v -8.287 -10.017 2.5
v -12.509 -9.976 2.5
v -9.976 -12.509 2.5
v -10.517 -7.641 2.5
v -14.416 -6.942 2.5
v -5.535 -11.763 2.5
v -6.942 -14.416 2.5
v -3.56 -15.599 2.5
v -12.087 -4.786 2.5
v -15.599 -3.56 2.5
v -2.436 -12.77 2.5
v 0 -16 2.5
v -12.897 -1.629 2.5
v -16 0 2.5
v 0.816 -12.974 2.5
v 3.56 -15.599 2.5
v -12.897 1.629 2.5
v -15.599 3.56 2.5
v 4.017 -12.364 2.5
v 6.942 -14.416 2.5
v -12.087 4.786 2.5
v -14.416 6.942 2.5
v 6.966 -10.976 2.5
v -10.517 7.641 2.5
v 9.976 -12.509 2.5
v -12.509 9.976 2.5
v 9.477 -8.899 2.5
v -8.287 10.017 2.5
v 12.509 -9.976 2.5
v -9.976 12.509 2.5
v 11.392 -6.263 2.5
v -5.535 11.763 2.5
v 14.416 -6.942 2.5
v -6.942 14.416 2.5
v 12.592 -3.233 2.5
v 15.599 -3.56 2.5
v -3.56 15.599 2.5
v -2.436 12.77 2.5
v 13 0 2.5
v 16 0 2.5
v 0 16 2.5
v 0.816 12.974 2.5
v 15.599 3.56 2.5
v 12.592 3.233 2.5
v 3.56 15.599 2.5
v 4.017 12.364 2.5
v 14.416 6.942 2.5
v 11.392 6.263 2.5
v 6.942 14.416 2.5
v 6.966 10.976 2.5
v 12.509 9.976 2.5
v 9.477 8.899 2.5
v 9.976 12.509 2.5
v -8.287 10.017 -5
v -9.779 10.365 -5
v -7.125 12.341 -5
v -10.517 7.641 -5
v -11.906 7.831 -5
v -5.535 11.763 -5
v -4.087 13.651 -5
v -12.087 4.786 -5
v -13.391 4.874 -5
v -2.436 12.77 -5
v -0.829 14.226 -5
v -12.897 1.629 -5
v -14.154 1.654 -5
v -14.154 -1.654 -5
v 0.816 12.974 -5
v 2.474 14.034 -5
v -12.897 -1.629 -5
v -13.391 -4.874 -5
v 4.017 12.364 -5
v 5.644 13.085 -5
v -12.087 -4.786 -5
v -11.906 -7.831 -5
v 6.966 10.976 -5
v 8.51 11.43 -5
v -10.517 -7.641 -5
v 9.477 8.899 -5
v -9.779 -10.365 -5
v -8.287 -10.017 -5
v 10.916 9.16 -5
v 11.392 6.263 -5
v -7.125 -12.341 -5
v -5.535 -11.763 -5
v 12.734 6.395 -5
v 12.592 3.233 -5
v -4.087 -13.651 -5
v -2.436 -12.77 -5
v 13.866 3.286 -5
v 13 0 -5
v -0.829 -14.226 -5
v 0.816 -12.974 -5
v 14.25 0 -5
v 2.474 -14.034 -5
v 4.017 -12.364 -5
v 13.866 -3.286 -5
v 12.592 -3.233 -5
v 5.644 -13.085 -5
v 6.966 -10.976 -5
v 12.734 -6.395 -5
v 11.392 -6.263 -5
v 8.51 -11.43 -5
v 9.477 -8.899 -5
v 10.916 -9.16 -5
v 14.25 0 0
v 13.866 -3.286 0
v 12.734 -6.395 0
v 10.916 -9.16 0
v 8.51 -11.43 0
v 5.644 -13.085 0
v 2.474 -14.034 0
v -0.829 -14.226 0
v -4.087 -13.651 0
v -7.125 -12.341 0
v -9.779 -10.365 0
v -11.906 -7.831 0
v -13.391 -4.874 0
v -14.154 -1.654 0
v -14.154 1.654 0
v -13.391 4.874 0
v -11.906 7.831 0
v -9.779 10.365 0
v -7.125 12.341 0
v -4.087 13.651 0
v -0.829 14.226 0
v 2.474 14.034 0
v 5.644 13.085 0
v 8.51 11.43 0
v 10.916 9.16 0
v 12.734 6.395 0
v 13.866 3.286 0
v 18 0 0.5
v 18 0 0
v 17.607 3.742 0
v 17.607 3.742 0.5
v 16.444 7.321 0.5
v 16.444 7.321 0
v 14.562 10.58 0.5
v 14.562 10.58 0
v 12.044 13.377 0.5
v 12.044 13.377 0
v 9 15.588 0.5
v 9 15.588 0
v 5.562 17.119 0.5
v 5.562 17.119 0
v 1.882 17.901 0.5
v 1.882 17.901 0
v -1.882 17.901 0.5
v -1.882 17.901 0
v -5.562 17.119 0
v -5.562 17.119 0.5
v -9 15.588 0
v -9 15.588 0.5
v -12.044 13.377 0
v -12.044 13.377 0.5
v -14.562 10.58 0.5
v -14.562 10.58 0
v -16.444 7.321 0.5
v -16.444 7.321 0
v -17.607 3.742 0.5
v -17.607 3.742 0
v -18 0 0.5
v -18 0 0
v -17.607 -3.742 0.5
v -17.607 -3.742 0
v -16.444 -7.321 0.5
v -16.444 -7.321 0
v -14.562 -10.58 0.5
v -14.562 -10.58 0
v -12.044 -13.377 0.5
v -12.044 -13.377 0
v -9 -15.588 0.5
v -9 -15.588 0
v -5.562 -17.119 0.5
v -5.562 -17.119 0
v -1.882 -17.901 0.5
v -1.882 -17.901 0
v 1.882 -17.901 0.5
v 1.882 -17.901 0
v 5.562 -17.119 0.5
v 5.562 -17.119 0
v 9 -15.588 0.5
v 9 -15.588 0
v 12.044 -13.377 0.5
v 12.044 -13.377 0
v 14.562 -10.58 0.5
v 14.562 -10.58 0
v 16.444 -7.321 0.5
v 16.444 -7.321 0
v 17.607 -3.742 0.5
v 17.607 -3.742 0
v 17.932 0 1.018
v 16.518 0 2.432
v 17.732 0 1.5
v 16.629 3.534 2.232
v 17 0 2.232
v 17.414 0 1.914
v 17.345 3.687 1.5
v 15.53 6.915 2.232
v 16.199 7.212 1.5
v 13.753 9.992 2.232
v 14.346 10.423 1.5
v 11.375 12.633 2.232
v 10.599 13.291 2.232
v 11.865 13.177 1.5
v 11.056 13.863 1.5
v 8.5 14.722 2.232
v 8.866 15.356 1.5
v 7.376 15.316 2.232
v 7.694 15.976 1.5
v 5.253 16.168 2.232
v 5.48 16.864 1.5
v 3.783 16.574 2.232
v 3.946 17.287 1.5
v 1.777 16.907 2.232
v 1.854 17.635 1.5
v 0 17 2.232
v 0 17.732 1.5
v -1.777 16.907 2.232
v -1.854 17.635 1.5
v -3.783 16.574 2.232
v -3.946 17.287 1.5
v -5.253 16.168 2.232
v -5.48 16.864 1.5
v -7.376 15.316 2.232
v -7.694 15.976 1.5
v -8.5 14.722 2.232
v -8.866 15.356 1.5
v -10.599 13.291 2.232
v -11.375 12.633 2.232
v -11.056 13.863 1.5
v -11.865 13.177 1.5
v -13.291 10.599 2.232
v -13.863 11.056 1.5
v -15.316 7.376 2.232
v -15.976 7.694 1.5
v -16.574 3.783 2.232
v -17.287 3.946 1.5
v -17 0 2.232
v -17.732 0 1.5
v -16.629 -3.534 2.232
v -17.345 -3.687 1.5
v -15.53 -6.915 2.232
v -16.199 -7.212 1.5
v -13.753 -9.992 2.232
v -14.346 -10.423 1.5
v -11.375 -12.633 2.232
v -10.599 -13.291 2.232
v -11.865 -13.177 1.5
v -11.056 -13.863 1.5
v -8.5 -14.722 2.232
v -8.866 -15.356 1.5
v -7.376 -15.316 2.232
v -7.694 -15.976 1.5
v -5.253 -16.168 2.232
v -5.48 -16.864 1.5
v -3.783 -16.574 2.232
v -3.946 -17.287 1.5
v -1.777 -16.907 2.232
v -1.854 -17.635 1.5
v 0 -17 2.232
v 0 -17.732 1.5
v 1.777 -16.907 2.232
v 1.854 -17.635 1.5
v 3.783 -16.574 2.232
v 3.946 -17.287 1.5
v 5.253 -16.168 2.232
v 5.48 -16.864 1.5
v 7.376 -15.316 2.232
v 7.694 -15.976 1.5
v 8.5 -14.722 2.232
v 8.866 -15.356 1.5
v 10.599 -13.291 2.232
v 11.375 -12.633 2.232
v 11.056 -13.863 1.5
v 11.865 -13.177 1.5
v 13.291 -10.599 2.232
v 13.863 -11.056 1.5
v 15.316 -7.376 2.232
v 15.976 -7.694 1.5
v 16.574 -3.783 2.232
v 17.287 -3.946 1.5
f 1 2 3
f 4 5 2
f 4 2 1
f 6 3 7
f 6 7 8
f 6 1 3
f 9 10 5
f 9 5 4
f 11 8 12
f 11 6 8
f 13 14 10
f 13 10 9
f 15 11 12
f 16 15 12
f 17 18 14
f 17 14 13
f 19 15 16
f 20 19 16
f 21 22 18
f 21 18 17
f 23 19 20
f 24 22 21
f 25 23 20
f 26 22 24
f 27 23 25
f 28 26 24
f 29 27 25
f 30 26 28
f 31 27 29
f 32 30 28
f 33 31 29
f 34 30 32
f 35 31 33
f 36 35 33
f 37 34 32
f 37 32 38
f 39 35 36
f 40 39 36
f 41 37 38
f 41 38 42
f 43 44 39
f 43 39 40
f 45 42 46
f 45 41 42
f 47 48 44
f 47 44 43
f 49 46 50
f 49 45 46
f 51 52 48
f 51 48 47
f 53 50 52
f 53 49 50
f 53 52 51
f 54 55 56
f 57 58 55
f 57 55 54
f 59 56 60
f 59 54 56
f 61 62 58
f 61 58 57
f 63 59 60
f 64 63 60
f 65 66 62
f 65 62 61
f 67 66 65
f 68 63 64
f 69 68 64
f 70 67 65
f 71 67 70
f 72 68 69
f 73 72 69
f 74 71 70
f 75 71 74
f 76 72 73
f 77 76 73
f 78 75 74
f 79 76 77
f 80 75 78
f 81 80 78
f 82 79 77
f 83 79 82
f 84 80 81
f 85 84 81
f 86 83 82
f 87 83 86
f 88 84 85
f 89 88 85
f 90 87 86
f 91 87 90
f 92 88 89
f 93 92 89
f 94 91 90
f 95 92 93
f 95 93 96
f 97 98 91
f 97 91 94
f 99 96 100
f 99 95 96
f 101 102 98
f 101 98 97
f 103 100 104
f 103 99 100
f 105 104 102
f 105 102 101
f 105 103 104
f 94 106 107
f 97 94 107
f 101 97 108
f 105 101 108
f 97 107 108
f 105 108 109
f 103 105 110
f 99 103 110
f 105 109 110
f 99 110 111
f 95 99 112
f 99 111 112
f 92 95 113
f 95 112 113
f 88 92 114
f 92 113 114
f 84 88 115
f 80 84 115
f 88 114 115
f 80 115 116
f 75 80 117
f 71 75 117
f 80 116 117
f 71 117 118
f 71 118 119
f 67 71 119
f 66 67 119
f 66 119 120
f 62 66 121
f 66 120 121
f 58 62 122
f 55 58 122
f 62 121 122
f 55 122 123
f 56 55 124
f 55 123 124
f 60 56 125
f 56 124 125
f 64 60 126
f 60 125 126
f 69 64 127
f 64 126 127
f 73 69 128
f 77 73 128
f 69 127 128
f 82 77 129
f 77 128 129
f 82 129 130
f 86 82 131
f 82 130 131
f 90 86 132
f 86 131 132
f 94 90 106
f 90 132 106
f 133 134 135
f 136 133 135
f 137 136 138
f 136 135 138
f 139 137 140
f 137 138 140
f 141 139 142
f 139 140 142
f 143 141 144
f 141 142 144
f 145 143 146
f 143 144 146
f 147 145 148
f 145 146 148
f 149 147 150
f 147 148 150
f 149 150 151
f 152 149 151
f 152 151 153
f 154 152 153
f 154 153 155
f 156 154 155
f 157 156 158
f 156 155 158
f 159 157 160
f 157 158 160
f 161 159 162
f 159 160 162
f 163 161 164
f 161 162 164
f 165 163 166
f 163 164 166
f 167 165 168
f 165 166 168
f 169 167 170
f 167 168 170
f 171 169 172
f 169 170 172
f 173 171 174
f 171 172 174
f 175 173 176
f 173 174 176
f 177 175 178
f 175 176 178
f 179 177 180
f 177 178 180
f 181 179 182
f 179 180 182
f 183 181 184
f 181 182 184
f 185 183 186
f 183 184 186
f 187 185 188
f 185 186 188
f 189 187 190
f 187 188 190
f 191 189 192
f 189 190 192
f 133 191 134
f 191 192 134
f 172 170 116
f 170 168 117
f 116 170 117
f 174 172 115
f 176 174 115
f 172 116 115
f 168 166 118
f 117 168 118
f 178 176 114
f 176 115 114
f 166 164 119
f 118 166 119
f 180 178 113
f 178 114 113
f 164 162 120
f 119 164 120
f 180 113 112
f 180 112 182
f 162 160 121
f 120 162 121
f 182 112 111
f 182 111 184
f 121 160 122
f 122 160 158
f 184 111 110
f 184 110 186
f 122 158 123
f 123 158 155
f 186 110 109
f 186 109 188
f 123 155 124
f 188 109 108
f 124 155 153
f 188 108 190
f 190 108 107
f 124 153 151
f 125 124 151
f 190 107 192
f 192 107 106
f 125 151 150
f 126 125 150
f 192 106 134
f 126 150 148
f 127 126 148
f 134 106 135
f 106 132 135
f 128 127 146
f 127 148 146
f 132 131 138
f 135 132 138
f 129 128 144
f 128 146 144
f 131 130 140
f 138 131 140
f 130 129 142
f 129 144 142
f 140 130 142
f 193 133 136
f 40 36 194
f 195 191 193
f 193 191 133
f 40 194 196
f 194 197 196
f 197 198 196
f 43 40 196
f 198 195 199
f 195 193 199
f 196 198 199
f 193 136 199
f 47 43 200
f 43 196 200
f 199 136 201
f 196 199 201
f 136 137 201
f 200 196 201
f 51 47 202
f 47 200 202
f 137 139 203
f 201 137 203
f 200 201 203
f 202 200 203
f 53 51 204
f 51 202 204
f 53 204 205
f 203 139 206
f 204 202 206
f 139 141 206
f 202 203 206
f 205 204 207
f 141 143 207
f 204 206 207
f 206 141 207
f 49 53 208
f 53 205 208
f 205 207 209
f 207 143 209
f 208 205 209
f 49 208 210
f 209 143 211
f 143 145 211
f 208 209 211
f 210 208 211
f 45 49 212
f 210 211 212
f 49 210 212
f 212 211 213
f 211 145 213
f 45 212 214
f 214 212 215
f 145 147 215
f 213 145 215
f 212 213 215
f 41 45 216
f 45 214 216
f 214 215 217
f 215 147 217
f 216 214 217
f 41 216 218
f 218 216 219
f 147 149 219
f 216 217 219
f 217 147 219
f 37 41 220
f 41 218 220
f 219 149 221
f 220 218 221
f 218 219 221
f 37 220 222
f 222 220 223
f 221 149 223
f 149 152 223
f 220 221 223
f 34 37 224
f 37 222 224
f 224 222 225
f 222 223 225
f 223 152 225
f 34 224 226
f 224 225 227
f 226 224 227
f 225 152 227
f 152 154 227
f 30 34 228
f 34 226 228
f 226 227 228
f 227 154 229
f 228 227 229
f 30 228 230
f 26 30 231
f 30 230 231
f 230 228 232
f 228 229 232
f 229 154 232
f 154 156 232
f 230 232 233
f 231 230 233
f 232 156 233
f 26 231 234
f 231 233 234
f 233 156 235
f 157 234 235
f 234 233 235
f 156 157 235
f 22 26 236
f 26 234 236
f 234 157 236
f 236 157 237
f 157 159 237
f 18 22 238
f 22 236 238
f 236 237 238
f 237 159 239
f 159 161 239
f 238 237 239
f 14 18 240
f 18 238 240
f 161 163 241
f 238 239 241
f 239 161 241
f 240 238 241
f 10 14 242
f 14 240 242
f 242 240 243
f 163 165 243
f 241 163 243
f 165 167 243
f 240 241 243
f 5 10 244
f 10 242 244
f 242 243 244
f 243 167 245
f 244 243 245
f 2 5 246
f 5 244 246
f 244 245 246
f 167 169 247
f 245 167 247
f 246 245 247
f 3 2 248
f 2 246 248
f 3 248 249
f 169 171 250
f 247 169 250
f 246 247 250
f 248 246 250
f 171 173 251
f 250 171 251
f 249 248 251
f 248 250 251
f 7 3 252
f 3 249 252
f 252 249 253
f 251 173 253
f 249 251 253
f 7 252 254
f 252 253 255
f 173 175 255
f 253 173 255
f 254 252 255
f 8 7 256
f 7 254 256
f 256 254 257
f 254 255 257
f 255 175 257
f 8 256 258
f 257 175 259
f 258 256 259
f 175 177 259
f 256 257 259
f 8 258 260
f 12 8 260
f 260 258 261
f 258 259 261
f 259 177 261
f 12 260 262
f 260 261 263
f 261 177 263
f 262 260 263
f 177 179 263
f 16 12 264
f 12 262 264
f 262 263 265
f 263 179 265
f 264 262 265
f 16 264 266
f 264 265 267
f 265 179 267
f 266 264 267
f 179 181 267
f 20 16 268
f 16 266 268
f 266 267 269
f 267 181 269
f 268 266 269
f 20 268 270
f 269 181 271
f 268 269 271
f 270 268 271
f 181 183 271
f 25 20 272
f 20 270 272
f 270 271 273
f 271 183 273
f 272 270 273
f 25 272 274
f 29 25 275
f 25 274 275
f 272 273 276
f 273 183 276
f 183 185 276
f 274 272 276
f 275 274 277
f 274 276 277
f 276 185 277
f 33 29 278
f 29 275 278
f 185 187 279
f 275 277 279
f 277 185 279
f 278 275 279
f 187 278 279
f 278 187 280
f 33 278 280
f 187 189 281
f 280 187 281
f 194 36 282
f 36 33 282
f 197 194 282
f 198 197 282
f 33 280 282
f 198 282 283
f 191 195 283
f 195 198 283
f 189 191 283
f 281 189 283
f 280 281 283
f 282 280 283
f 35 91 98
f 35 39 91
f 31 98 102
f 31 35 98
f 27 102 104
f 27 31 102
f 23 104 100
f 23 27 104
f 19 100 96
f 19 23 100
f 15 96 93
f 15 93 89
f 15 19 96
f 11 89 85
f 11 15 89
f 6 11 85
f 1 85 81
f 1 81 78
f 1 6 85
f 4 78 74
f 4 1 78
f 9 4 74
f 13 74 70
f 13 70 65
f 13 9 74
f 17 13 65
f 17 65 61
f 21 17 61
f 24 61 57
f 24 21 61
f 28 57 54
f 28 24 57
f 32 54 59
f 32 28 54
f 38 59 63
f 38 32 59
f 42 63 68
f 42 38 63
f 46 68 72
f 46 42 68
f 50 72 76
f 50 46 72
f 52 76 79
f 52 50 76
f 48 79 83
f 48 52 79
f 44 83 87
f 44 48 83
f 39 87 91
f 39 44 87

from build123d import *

# Parameters (mm, degrees)
F0_R     = 18
F0_R_2   = 13
F1_DEPTH = 2.5
F2_R     = 14.25
F2_R_2   = 13
F3_DEPTH = 5
F4_R     = 2


with BuildPart() as f1:
    # F0 (on Top) → F1 (new body)
    with BuildSketch(Plane.XY):
        Circle(F0_R)
        Circle(F0_R_2, mode=Mode.SUBTRACT)
    extrude(amount=F1_DEPTH)

    # F2 (on face) → F3 (join)
    with BuildSketch(Plane(origin=(0, 0, 0), x_dir=(1, 0, 0), z_dir=(0, 0, -1))):
        Circle(F2_R)
        Circle(F2_R_2, mode=Mode.SUBTRACT)
    extrude(amount=F3_DEPTH)

    # F4
    f4_edges = [f1.edges().sort_by_distance(p)[0] for p in [
        (-18, 0, 2.5),
    ]]
    fillet(f4_edges, radius=F4_R)


solid = f1.part
